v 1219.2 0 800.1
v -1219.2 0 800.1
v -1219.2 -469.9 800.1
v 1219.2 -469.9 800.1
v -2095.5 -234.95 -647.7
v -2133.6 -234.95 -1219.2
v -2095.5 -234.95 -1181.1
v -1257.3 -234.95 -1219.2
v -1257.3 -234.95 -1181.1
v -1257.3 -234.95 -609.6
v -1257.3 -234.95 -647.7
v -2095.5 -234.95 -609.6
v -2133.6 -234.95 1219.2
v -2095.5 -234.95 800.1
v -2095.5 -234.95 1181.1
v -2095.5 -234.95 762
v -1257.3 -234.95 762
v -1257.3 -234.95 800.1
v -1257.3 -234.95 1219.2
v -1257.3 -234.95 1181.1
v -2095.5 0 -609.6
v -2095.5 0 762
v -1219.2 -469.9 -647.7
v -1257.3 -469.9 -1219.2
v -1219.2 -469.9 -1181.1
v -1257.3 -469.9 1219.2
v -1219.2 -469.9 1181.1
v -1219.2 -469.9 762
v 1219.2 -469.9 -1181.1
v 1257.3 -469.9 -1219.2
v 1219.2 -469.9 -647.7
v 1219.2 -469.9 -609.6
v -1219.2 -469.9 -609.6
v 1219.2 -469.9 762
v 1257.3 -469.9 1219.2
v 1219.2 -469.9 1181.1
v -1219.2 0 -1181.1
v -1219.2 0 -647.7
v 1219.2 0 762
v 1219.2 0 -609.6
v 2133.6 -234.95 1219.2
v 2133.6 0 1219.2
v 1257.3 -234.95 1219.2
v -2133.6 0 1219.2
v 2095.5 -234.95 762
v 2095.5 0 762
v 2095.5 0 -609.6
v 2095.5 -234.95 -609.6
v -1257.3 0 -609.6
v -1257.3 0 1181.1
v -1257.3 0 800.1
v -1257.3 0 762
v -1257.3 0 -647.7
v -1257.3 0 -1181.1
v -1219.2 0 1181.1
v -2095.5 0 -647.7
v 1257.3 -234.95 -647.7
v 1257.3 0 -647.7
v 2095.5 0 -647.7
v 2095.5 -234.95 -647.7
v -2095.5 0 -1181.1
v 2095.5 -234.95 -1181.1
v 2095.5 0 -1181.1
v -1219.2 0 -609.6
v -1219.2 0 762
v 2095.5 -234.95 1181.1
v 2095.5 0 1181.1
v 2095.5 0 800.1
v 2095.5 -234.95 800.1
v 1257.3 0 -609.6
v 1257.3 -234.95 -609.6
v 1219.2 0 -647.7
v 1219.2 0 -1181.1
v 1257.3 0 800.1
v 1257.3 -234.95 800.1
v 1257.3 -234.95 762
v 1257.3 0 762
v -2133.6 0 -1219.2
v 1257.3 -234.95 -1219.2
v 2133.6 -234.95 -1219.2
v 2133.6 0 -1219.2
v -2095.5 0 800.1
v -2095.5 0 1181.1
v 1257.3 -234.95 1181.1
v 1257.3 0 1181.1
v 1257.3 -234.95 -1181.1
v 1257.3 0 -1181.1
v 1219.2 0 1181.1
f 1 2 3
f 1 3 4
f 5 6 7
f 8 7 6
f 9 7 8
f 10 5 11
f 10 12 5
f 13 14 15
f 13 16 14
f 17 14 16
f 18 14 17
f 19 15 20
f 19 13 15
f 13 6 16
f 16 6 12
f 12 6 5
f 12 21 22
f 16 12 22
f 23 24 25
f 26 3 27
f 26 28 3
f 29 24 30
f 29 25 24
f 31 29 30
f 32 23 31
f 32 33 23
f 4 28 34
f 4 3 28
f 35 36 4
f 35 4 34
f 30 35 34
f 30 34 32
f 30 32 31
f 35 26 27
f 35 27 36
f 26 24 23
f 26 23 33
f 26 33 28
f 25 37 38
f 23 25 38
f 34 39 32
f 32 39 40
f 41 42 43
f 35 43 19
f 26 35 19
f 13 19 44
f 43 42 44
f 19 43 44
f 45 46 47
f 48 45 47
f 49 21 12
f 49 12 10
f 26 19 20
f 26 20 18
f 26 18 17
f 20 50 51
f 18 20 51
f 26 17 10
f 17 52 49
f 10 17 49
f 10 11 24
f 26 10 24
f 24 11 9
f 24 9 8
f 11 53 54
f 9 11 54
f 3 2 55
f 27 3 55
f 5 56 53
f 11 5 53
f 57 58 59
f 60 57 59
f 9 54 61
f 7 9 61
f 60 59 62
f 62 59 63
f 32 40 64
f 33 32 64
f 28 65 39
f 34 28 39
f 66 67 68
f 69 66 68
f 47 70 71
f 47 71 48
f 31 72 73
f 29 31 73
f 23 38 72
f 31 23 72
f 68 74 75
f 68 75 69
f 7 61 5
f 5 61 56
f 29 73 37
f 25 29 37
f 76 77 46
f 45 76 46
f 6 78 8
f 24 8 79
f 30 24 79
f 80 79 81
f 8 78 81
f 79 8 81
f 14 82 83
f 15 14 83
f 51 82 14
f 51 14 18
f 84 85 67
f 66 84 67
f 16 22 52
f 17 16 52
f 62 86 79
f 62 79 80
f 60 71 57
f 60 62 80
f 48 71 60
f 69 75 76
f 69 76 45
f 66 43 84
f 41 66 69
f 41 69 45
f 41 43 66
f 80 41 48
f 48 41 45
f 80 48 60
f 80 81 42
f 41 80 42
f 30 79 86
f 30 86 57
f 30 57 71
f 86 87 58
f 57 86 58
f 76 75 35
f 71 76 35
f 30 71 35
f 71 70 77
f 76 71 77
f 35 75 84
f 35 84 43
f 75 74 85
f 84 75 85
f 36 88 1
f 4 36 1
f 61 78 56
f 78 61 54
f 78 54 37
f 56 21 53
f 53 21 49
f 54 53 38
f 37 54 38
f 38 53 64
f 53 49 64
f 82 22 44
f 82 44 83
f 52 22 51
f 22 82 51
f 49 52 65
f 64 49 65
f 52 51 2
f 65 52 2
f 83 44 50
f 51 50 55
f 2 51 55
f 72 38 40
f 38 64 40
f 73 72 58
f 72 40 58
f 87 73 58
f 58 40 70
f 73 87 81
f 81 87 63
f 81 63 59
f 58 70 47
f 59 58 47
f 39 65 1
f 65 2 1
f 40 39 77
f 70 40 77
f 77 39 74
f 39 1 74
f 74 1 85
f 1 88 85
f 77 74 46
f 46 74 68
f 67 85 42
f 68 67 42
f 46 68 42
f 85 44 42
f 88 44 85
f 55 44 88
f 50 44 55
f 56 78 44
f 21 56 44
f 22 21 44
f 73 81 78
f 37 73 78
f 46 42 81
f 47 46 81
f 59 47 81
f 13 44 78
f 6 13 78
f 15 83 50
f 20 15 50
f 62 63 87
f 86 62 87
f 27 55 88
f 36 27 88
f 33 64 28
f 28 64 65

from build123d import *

# Parameters (mm, degrees)
F0_W     = 2438.4
F0_H     = 38.1
F1_DEPTH = 469.9
F0_W_2   = 838.2
F2_DEPTH = 234.95


with BuildPart() as f1:
    # F0 (on Front) → F1 (new body)
    with BuildSketch(Plane.XZ):
        Polygon((457.2, -1219.2), (1257.3, -1219.2), (1257.3, -1181.1), (1219.2, -1181.1), (457.2, -1181.1), (-457.2, -1181.1), (-1219.2, -1181.1), (-1257.3, -1181.1), (-1257.3, -1219.2), (-457.2, -1219.2), align=None)
        Polygon((1257.3, 800.1), (1257.3, 1181.1), (1219.2, 1181.1), (1219.2, 800.1), (1219.2, 762), (1219.2, -609.6), (1219.2, -647.7), (1219.2, -1181.1), (1257.3, -1181.1), (1257.3, -647.7), (1257.3, -609.6), (1257.3, 762), align=None)
        Polygon((1219.2, -647.7), (1219.2, -609.6), (457.2, -609.6), (-457.2, -609.6), (-1219.2, -609.6), (-1219.2, -647.7), (-457.2, -647.7), (457.2, -647.7), align=None)
        Polygon((-1219.2, 1181.1), (-1257.3, 1181.1), (-1257.3, 800.1), (-1257.3, 762), (-1257.3, -609.6), (-1257.3, -647.7), (-1257.3, -1181.1), (-1219.2, -1181.1), (-1219.2, -647.7), (-1219.2, -609.6), (-1219.2, 762), (-1219.2, 800.1), align=None)
        Polygon((1257.3, 1181.1), (1257.3, 1219.2), (-1257.3, 1219.2), (-1257.3, 1181.1), (-1219.2, 1181.1), (1219.2, 1181.1), align=None)
        with Locations((0, 781.05)):
            Rectangle(F0_W, F0_H)
    extrude(amount=F1_DEPTH)

    # F0 (on Front) → F2 (join)
    with BuildSketch(Plane.XZ):
        Polygon((2133.6, 1181.1), (2133.6, 1219.2), (1257.3, 1219.2), (1257.3, 1181.1), (2095.5, 1181.1), align=None)
        Polygon((2133.6, -1181.1), (2133.6, 1181.1), (2095.5, 1181.1), (2095.5, 800.1), (2095.5, 762), (2095.5, -609.6), (2095.5, -647.7), (2095.5, -1181.1), align=None)
        with Locations((1676.4, 781.05)):
            Rectangle(F0_W_2, F0_H)
        with Locations((1676.4, -628.65)):
            Rectangle(F0_W_2, F0_H)
        Polygon((2133.6, -1219.2), (2133.6, -1181.1), (2095.5, -1181.1), (1257.3, -1181.1), (1257.3, -1219.2), align=None)
        with Locations((-1676.4, -628.65)):
            Rectangle(F0_W_2, F0_H)
        Polygon((-2095.5, -1181.1), (-2133.6, -1181.1), (-2133.6, -1219.2), (-1257.3, -1219.2), (-1257.3, -1181.1), align=None)
        Polygon((-2095.5, 1181.1), (-2133.6, 1181.1), (-2133.6, -1181.1), (-2095.5, -1181.1), (-2095.5, -647.7), (-2095.5, -609.6), (-2095.5, 762), (-2095.5, 800.1), align=None)
        with Locations((-1676.4, 781.05)):
            Rectangle(F0_W_2, F0_H)
        Polygon((-1257.3, 1181.1), (-1257.3, 1219.2), (-2133.6, 1219.2), (-2133.6, 1181.1), (-2095.5, 1181.1), align=None)
    extrude(amount=F2_DEPTH)


solid = f1.part
